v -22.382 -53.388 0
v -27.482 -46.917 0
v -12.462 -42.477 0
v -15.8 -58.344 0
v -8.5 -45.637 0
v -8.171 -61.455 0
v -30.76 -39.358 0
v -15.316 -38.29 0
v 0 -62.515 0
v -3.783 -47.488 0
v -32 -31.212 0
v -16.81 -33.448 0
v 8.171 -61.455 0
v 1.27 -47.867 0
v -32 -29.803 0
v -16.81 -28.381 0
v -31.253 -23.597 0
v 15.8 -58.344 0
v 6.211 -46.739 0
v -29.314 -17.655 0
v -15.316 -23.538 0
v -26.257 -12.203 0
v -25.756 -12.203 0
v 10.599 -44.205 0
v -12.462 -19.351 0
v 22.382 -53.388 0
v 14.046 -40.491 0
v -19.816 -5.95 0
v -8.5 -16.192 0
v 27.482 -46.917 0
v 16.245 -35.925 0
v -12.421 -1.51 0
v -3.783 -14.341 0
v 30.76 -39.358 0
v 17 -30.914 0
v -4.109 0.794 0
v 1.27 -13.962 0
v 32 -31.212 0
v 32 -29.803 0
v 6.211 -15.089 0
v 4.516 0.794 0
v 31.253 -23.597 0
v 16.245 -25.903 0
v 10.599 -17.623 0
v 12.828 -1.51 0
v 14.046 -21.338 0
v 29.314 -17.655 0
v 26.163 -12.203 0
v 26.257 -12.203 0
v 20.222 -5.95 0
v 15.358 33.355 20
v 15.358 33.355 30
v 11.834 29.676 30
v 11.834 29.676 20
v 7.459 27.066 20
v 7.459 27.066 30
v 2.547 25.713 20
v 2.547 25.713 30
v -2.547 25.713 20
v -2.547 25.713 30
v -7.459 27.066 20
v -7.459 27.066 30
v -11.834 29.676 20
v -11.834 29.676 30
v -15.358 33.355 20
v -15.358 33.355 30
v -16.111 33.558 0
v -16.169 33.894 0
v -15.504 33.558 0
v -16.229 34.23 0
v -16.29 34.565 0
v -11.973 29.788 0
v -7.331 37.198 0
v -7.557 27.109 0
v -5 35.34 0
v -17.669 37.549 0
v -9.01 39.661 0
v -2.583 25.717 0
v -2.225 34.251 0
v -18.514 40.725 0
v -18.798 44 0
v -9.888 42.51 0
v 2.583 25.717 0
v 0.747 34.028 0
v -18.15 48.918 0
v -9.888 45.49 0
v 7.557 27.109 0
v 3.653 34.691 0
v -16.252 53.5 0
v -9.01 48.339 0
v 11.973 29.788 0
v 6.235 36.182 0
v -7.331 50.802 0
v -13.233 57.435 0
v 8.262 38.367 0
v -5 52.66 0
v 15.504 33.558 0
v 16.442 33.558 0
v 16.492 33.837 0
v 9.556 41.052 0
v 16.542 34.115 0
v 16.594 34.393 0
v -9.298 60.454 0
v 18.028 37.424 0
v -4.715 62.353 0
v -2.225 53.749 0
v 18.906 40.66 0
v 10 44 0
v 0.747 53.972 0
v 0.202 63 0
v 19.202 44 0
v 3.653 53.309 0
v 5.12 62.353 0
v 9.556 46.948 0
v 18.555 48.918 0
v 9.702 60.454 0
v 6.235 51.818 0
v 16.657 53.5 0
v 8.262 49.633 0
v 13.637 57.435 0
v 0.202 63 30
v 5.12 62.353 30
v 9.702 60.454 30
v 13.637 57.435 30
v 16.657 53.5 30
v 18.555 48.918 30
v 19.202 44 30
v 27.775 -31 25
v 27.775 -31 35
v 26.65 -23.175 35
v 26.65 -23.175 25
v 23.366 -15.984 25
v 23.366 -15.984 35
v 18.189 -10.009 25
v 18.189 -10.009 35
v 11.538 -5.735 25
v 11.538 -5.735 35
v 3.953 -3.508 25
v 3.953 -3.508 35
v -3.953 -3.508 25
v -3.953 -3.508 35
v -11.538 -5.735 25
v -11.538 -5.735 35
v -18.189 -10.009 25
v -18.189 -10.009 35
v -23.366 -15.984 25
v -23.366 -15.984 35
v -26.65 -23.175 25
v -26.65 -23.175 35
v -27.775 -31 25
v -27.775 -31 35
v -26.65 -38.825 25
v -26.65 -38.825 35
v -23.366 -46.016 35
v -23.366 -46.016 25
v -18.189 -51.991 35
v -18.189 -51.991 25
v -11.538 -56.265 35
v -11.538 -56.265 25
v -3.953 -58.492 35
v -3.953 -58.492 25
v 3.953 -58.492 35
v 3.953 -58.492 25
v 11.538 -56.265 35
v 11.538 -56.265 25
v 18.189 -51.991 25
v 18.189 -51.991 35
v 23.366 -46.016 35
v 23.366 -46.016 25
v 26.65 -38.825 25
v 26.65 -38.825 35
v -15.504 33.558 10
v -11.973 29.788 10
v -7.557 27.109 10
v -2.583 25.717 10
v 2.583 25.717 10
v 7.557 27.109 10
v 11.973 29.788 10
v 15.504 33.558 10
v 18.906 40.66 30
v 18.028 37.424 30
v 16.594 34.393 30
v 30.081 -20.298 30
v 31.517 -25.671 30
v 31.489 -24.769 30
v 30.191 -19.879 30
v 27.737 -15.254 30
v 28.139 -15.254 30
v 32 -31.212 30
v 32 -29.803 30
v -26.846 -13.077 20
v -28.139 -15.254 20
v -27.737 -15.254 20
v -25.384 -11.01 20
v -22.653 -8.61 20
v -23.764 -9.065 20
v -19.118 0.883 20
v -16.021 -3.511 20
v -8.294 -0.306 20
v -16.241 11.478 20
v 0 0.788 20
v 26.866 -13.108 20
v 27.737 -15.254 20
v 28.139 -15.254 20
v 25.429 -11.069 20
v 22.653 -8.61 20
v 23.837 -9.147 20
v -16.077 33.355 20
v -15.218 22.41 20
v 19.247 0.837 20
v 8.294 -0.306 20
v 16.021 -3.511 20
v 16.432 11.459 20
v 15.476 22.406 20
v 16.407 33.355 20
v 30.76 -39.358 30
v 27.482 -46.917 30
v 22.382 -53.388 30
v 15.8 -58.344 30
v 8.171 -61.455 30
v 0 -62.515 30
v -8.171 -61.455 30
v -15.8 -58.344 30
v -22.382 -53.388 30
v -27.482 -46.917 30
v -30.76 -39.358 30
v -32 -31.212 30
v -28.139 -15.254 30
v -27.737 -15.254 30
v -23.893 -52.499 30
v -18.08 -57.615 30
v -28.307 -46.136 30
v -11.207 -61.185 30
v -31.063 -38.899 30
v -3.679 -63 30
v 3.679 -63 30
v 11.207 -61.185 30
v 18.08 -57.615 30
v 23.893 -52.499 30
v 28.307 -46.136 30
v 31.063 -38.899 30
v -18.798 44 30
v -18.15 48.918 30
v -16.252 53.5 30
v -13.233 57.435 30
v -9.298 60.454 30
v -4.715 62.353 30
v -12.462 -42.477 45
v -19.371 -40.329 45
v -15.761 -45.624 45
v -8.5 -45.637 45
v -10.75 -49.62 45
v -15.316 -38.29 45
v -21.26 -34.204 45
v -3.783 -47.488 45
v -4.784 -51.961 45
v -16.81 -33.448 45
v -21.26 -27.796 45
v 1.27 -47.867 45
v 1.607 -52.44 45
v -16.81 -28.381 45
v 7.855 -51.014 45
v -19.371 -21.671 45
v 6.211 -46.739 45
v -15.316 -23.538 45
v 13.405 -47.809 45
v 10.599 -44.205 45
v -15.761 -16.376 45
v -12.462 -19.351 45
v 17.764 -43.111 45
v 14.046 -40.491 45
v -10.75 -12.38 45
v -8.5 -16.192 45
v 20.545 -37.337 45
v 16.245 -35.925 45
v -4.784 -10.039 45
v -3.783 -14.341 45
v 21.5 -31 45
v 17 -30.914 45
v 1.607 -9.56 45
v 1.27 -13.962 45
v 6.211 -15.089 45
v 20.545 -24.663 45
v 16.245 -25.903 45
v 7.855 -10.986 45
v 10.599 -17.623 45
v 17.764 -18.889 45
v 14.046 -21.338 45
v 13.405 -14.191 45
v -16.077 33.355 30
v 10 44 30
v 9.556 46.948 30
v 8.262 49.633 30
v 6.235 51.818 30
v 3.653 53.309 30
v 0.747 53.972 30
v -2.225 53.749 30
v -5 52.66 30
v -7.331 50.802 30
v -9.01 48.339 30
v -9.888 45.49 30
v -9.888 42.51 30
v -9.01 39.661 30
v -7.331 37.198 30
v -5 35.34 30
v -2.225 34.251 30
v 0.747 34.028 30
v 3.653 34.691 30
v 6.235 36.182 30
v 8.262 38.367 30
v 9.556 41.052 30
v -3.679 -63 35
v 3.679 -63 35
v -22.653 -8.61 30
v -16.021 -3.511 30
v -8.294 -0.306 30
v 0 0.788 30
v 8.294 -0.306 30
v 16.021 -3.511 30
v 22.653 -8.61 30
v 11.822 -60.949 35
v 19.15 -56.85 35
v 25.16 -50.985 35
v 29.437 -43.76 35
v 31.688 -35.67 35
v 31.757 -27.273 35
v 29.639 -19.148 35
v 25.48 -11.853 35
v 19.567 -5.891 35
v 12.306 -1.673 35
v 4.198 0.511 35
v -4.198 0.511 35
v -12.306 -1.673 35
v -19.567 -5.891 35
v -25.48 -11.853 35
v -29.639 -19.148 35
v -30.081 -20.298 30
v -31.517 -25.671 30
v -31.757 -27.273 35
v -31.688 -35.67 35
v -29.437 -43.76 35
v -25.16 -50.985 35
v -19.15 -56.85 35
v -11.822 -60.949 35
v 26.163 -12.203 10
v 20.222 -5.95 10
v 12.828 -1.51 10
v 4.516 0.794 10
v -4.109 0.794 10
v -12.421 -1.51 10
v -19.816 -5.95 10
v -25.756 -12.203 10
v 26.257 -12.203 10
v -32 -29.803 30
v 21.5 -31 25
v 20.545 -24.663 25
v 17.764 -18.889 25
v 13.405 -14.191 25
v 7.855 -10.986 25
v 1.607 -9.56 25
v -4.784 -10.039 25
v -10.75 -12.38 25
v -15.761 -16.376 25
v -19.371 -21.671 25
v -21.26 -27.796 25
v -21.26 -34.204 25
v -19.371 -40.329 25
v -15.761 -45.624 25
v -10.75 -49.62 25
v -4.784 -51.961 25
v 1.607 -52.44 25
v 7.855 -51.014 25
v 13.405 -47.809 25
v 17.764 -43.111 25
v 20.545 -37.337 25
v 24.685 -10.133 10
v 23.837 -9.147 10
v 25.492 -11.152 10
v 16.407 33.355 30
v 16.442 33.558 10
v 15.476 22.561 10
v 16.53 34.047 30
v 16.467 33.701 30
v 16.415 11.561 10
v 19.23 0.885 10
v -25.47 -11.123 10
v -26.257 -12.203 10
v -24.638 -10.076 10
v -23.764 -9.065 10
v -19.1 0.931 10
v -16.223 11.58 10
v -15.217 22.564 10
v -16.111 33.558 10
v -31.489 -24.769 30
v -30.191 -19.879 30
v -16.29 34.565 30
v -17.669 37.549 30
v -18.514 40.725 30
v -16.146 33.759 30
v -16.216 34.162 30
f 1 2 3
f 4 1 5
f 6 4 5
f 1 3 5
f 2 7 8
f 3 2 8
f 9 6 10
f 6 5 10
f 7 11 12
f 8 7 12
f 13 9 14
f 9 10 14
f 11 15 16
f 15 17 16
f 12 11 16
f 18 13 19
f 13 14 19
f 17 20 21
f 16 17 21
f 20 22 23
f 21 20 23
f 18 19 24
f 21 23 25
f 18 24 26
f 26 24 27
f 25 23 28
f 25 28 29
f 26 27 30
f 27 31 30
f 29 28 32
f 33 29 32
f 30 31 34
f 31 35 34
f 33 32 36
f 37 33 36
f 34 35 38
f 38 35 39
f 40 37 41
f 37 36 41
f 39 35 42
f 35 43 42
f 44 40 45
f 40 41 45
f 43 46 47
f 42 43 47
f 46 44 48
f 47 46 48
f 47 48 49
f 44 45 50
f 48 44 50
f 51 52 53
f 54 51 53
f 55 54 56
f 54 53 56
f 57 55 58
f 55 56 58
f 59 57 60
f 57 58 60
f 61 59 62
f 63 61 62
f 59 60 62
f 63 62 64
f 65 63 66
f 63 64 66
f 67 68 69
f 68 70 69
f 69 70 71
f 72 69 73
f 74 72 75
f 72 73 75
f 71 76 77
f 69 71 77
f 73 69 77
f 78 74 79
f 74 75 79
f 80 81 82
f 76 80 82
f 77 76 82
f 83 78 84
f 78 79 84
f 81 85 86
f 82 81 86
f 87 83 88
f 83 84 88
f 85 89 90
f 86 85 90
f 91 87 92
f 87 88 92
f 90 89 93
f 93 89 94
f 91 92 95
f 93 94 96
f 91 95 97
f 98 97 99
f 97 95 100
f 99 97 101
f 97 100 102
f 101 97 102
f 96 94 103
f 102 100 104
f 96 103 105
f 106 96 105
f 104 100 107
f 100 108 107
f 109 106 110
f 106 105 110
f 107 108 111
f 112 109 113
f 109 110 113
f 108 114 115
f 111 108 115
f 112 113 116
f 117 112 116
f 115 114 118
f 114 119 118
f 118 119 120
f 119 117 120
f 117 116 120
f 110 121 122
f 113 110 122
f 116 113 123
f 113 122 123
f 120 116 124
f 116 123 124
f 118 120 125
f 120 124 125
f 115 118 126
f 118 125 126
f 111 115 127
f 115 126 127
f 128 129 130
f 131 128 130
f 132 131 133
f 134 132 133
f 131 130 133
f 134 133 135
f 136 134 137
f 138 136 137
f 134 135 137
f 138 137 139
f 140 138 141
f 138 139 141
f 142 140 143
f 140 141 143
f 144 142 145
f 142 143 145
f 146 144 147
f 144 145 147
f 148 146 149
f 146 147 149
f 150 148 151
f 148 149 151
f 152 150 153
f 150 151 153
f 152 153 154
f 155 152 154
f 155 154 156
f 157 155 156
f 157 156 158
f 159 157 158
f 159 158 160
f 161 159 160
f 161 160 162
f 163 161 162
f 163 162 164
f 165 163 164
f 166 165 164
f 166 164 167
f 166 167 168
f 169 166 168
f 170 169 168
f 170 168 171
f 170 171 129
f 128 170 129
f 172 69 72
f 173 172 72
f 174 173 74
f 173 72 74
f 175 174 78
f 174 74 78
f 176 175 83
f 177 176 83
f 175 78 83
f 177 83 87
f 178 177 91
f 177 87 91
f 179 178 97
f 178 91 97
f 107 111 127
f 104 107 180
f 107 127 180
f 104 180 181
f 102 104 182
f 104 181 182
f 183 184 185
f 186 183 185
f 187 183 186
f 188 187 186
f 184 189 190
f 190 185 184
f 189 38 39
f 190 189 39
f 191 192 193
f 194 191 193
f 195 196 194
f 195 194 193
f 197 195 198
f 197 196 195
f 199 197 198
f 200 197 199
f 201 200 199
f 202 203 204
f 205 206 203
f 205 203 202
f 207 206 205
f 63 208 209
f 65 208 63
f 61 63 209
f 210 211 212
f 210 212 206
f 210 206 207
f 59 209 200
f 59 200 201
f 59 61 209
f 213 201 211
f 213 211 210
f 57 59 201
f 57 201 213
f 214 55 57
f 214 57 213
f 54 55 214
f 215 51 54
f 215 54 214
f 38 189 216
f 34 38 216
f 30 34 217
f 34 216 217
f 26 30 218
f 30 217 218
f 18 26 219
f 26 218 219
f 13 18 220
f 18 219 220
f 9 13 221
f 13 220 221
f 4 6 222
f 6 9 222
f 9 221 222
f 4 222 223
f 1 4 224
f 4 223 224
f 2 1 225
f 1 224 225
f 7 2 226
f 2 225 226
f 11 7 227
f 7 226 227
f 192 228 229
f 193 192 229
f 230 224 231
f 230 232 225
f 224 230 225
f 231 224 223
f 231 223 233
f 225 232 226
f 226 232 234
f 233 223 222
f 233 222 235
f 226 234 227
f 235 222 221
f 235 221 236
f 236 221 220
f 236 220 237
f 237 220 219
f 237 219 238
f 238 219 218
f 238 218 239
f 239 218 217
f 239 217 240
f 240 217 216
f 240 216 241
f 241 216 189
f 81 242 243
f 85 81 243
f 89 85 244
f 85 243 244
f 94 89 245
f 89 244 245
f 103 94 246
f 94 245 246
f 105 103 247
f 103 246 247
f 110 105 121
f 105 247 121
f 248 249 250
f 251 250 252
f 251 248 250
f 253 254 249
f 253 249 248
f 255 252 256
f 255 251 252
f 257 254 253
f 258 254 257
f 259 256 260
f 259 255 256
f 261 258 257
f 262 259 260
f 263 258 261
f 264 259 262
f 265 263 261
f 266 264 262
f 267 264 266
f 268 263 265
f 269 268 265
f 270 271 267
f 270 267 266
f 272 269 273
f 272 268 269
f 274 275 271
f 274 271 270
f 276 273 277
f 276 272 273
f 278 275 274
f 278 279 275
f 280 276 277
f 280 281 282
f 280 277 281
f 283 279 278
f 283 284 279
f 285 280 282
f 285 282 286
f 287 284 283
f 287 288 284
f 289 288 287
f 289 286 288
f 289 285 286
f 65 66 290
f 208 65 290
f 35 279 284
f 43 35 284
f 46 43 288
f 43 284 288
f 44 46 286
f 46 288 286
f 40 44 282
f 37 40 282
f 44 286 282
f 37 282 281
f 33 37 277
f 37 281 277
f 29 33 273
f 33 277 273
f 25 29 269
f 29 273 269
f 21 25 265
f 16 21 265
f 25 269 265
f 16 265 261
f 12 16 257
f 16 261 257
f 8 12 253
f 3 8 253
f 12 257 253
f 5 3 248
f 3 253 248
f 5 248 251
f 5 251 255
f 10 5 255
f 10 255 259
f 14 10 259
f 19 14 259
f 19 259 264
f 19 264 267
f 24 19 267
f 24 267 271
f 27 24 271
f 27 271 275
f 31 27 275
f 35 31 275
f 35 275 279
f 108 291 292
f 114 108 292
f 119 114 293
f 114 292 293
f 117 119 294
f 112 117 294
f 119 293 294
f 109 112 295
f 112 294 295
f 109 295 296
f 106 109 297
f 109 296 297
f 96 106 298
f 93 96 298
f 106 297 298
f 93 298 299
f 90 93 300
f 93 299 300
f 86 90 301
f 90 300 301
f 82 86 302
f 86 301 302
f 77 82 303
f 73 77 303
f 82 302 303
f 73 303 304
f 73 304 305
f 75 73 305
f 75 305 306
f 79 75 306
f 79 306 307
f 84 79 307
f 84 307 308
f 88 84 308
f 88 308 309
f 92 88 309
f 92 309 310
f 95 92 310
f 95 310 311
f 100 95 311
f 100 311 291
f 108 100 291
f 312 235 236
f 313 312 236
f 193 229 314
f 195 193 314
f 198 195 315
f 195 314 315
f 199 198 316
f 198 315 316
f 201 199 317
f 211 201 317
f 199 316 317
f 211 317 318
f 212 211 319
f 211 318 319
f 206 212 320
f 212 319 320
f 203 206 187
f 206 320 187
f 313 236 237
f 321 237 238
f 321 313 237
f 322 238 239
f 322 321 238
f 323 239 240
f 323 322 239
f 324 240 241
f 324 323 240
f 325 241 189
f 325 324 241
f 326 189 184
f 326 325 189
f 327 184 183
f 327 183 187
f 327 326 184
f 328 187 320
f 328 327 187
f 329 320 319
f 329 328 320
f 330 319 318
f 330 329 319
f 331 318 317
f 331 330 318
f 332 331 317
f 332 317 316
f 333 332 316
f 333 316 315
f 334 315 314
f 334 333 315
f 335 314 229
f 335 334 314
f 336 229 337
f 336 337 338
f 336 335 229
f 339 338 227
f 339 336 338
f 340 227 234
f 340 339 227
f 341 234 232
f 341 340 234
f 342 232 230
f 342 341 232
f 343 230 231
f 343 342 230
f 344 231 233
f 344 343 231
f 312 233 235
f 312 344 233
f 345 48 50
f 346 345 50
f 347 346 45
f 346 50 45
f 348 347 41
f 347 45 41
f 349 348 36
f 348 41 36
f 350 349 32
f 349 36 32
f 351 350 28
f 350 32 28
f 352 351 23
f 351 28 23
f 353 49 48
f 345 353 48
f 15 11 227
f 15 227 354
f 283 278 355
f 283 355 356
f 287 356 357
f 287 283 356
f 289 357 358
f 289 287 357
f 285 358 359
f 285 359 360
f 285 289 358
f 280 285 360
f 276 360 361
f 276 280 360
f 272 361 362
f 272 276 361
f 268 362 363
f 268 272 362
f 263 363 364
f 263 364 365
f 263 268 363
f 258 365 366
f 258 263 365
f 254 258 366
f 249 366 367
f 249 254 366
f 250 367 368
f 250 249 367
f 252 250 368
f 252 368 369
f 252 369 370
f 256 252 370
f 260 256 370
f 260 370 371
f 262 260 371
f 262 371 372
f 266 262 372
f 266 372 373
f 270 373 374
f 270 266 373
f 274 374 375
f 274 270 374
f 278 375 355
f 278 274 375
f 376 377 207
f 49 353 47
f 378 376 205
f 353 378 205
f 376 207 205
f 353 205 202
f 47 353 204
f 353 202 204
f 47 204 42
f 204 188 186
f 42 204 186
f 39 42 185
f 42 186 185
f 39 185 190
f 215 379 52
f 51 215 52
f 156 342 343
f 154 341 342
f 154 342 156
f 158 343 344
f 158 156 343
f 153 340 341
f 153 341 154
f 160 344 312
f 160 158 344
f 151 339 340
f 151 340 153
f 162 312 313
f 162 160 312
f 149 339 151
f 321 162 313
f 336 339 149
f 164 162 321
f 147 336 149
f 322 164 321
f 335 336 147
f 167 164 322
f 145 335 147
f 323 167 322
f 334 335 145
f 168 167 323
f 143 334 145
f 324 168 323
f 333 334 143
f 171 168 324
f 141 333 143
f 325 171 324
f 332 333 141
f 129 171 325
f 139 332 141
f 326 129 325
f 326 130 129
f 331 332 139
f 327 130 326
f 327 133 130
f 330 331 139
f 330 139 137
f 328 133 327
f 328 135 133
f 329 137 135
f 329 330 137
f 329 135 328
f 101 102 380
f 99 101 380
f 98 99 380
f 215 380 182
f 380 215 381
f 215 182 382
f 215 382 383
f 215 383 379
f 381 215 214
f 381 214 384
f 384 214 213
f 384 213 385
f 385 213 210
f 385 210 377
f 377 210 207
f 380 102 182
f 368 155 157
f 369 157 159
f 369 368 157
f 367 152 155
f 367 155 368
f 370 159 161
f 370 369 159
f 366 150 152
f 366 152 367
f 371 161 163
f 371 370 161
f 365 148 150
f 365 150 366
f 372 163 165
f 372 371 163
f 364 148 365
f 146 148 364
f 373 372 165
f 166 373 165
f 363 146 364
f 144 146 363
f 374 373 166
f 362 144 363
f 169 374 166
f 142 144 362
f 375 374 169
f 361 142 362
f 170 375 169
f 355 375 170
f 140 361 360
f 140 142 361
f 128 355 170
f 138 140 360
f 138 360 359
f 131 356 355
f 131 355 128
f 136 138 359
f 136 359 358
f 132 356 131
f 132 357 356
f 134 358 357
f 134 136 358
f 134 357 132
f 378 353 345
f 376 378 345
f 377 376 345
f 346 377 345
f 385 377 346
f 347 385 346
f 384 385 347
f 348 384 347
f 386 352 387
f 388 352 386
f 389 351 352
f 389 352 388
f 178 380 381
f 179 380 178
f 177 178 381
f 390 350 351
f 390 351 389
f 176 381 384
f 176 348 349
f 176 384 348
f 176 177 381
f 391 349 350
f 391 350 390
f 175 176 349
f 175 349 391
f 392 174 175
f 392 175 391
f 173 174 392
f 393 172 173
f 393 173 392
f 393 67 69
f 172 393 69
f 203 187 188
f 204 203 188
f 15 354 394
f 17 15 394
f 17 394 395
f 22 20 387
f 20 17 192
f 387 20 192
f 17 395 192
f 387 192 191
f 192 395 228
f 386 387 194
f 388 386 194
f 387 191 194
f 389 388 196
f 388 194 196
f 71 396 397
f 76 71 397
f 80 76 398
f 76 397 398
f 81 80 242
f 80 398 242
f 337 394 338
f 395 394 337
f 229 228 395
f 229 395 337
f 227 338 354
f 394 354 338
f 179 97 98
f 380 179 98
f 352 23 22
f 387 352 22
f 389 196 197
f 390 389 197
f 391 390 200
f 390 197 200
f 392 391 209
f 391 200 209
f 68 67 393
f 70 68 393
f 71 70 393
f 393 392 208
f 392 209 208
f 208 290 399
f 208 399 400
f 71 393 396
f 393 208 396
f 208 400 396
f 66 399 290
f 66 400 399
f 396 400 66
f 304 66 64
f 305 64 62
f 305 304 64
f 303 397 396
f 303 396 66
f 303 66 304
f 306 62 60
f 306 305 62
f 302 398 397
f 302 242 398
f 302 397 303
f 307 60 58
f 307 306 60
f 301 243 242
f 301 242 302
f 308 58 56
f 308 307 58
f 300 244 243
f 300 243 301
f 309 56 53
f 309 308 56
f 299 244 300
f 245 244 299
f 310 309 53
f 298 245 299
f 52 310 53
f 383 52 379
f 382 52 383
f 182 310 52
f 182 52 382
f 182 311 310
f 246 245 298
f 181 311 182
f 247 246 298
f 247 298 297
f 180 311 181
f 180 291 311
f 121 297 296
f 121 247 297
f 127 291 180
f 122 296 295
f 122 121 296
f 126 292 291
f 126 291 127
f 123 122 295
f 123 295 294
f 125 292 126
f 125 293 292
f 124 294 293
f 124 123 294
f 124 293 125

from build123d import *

# Parameters (mm, degrees)
ESQUISSE1_W              = 64
ESQUISSE1_H              = 126
BOSS_EXTRU_1_DEPTH       = 45
ESQUISSE2_W              = 74.759642061
ESQUISSE2_H              = 139.382383503
ESQUISSE2_R              = 32
ENL_V_MAT_EXTRU_2_DEPTH  = 15
ESQUISSE3_R              = 27.5
ENL_V_MAT_EXTRU_5_DEPTH  = 10
ESQUISSE5_R              = 27.775
ESQUISSE5_R_2            = 21.5
ENL_V_MAT_EXTRU_7_DEPTH  = 20
ESQUISSE6_R              = 17
ENL_V_MAT_EXTRU_8_DEPTH  = 84.773504165
ESQUISSE7_R              = 10
ENL_V_MAT_EXTRU_9_DEPTH  = 77.765877836
ESQUISSE8_W              = 86.397385067
ESQUISSE8_H              = 136.429769075
ENL_V_MAT_EXTRU_11_DEPTH = 77.765877836
ENL_V_MAT_EXTRU_12_DEPTH = 10
ENL_V_MAT_EXTRU_13_DEPTH = 10


with BuildPart() as part:
    # Esquisse1 → Boss.-Extru.1 (new body)
    with BuildSketch(Plane.XY):
        Rectangle(ESQUISSE1_W, ESQUISSE1_H)
    extrude(amount=BOSS_EXTRU_1_DEPTH)

    # Esquisse2 → Enlèv. mat.-Extru.2 (cut)
    with BuildSketch(Plane.XY.offset(45)):
        with Locations((-0.51685586, -5.363099381)):
            Rectangle(ESQUISSE2_W, ESQUISSE2_H)
        with Locations((0, -31.212195959)):
            Circle(ESQUISSE2_R, mode=Mode.SUBTRACT)
    extrude(amount=-ENL_V_MAT_EXTRU_2_DEPTH, mode=Mode.SUBTRACT)

    # Esquisse3 → Enlèv. mat.-Extru.5 (cut)
    with BuildSketch(Plane.XY.offset(45)):
        with BuildLine():
            Line((-3.679064313, -63), (3.679064313, -63))
            ThreePointArc((3.679064313, -63), (0, 0.787804041), (-3.679064313, -63))
        make_face()
        with Locations((0, -31.212195959)):
            Circle(ESQUISSE3_R, mode=Mode.SUBTRACT)
    extrude(amount=-ENL_V_MAT_EXTRU_5_DEPTH, mode=Mode.SUBTRACT)

    # Esquisse5 → Enlèv. mat.-Extru.7 (cut)
    with BuildSketch(Plane.XY.offset(45)):
        with Locations((0, -31)):
            Circle(ESQUISSE5_R)
        with Locations((0, -31)):
            Circle(ESQUISSE5_R_2, mode=Mode.SUBTRACT)
    extrude(amount=-ENL_V_MAT_EXTRU_7_DEPTH, mode=Mode.SUBTRACT)

    # Esquisse6 → Enlèv. mat.-Extru.8 (cut, through all)
    with BuildSketch(Plane.XY.offset(45)):
        with Locations((0, -30.914318574)):
            Circle(ESQUISSE6_R)
    extrude(amount=-ENL_V_MAT_EXTRU_8_DEPTH, mode=Mode.SUBTRACT)

    # Esquisse7 → Enlèv. mat.-Extru.9 (cut, through all)
    with BuildSketch(Plane.XY.offset(30)):
        with Locations((0, 44)):
            Circle(ESQUISSE7_R)
    extrude(amount=-ENL_V_MAT_EXTRU_9_DEPTH, mode=Mode.SUBTRACT)

    # Esquisse8 → Enlèv. mat.-Extru.11 (cut, through all)
    with BuildSketch(Plane.XY.offset(30)):
        with Locations((-1.464362458, -2.806694712)):
            Rectangle(ESQUISSE8_W, ESQUISSE8_H)
        with BuildLine():
            Line((-32, 63), (0.202169279, 63))
            Line((0.202169279, 63), (32, 63))
            Line((32, 63), (32, -29.80290649))
            ThreePointArc((32, -29.80290649), (32.005817879, -30.155207508), (32.00775725, -30.507551224))
            ThreePointArc((32.00775725, -30.507551224), (32.005817879, -30.85989494), (32, -31.212195959))
            ThreePointArc((32, -31.212195959), (0, -62.515308475), (-32, -31.212195959))
            ThreePointArc((-32, -31.212195959), (-32.00775725, -30.507551224), (-32, -29.80290649))
            Line((-32, -29.80290649), (-32, 63))
        make_face(mode=Mode.SUBTRACT)
        with BuildLine():
            ThreePointArc((0.202169279, 63), (13.63719816, 57.435028864), (19.202169338, 44))
            ThreePointArc((19.202169338, 44), (18.538621544, 39.022599022), (16.594325075, 34.392855247))
            ThreePointArc((16.594325075, 34.392855247), (16.343681733, 11.978736432), (23.83747578, -9.147043911))
            ThreePointArc((23.83747578, -9.147043911), (29.76780291, -18.744284921), (32, -29.80290649))
            Line((32, -29.80290649), (32, 63))
            Line((32, 63), (0.202169279, 63))
        make_face()
        with BuildLine():
            ThreePointArc((-18.797830662, 44), (-13.232859525, 57.435028822), (0.202169279, 63))
            Line((0.202169279, 63), (-32, 63))
            Line((-32, 63), (-32, -29.80290649))
            ThreePointArc((-32, -29.80290649), (-29.74748685, -18.693002977), (-23.763712379, -9.065011772))
            ThreePointArc((-23.763712379, -9.065011772), (-16.134588528, 12.08350842), (-16.289948146, 34.565485657))
            ThreePointArc((-16.289948146, 34.565485657), (-18.160159384, 39.118925948), (-18.797830662, 44))
        make_face()
    extrude(amount=-ENL_V_MAT_EXTRU_11_DEPTH, mode=Mode.SUBTRACT)

    # Esquisse10 → Enlèv. mat.-Extru.12 (cut)
    with BuildSketch(Plane.XY.offset(30)):
        with BuildLine():
            Line((-15.358096219, 33.354922672), (-16.07732259, 33.354922672))
            ThreePointArc((-16.07732259, 33.354922672), (-16.24125544, 11.478282043), (-23.763712379, -9.065011772))
            ThreePointArc((-23.763712379, -9.065011772), (-26.135325713, -12.029421609), (-28.139276, -15.253775612))
            Line((-28.139276, -15.253775612), (-27.736777391, -15.253775612))
            ThreePointArc((-27.736777391, -15.253775612), (0, 0.787804041), (27.736777391, -15.253775612))
            Line((27.736777391, -15.253775612), (28.139276, -15.253775612))
            ThreePointArc((28.139276, -15.253775612), (26.167130611, -12.074488543), (23.83747578, -9.147043911))
            ThreePointArc((23.83747578, -9.147043911), (16.432370726, 11.458852589), (16.406556938, 33.354922672))
            Line((16.406556938, 33.354922672), (15.358096219, 33.354922672))
            ThreePointArc((15.358096219, 33.354922672), (0, 25.541024787), (-15.358096219, 33.354922672))
        make_face()
    extrude(amount=-ENL_V_MAT_EXTRU_12_DEPTH, mode=Mode.SUBTRACT)

    # Esquisse11 → Enlèv. mat.-Extru.13 (cut)
    with BuildSketch(Plane(origin=(0, 0, 0), x_dir=(-1, 0, 0), z_dir=(0, 0, -1))):
        with BuildLine():
            Line((-15.504189616, 33.558306347), (-16.441959806, 33.558306347))
            ThreePointArc((-16.441959806, 33.558306347), (-16.41467553, 11.560545546), (-23.83747578, -9.147043911))
            ThreePointArc((-23.83747578, -9.147043911), (-25.093902529, -10.63816321), (-26.257202417, -12.20302049))
            Line((-26.257202417, -12.20302049), (-26.162723497, -12.20302049))
            ThreePointArc((-26.162723497, -12.20302049), (-0.203383675, 1.085681426), (25.755956147, -12.20302049))
            Line((25.755956147, -12.20302049), (26.257202417, -12.20302049))
            ThreePointArc((26.257202417, -12.20302049), (25.059623979, -10.594947923), (23.763712379, -9.065011772))
            ThreePointArc((23.763712379, -9.065011772), (16.222953758, 11.579751881), (16.111372133, 33.558306347))
            Line((16.111372133, 33.558306347), (15.504189616, 33.558306347))
            ThreePointArc((15.504189616, 33.558306347), (0, 25.541024787), (-15.504189616, 33.558306347))
        make_face()
    extrude(amount=-ENL_V_MAT_EXTRU_13_DEPTH, mode=Mode.SUBTRACT)


solid = part.part
